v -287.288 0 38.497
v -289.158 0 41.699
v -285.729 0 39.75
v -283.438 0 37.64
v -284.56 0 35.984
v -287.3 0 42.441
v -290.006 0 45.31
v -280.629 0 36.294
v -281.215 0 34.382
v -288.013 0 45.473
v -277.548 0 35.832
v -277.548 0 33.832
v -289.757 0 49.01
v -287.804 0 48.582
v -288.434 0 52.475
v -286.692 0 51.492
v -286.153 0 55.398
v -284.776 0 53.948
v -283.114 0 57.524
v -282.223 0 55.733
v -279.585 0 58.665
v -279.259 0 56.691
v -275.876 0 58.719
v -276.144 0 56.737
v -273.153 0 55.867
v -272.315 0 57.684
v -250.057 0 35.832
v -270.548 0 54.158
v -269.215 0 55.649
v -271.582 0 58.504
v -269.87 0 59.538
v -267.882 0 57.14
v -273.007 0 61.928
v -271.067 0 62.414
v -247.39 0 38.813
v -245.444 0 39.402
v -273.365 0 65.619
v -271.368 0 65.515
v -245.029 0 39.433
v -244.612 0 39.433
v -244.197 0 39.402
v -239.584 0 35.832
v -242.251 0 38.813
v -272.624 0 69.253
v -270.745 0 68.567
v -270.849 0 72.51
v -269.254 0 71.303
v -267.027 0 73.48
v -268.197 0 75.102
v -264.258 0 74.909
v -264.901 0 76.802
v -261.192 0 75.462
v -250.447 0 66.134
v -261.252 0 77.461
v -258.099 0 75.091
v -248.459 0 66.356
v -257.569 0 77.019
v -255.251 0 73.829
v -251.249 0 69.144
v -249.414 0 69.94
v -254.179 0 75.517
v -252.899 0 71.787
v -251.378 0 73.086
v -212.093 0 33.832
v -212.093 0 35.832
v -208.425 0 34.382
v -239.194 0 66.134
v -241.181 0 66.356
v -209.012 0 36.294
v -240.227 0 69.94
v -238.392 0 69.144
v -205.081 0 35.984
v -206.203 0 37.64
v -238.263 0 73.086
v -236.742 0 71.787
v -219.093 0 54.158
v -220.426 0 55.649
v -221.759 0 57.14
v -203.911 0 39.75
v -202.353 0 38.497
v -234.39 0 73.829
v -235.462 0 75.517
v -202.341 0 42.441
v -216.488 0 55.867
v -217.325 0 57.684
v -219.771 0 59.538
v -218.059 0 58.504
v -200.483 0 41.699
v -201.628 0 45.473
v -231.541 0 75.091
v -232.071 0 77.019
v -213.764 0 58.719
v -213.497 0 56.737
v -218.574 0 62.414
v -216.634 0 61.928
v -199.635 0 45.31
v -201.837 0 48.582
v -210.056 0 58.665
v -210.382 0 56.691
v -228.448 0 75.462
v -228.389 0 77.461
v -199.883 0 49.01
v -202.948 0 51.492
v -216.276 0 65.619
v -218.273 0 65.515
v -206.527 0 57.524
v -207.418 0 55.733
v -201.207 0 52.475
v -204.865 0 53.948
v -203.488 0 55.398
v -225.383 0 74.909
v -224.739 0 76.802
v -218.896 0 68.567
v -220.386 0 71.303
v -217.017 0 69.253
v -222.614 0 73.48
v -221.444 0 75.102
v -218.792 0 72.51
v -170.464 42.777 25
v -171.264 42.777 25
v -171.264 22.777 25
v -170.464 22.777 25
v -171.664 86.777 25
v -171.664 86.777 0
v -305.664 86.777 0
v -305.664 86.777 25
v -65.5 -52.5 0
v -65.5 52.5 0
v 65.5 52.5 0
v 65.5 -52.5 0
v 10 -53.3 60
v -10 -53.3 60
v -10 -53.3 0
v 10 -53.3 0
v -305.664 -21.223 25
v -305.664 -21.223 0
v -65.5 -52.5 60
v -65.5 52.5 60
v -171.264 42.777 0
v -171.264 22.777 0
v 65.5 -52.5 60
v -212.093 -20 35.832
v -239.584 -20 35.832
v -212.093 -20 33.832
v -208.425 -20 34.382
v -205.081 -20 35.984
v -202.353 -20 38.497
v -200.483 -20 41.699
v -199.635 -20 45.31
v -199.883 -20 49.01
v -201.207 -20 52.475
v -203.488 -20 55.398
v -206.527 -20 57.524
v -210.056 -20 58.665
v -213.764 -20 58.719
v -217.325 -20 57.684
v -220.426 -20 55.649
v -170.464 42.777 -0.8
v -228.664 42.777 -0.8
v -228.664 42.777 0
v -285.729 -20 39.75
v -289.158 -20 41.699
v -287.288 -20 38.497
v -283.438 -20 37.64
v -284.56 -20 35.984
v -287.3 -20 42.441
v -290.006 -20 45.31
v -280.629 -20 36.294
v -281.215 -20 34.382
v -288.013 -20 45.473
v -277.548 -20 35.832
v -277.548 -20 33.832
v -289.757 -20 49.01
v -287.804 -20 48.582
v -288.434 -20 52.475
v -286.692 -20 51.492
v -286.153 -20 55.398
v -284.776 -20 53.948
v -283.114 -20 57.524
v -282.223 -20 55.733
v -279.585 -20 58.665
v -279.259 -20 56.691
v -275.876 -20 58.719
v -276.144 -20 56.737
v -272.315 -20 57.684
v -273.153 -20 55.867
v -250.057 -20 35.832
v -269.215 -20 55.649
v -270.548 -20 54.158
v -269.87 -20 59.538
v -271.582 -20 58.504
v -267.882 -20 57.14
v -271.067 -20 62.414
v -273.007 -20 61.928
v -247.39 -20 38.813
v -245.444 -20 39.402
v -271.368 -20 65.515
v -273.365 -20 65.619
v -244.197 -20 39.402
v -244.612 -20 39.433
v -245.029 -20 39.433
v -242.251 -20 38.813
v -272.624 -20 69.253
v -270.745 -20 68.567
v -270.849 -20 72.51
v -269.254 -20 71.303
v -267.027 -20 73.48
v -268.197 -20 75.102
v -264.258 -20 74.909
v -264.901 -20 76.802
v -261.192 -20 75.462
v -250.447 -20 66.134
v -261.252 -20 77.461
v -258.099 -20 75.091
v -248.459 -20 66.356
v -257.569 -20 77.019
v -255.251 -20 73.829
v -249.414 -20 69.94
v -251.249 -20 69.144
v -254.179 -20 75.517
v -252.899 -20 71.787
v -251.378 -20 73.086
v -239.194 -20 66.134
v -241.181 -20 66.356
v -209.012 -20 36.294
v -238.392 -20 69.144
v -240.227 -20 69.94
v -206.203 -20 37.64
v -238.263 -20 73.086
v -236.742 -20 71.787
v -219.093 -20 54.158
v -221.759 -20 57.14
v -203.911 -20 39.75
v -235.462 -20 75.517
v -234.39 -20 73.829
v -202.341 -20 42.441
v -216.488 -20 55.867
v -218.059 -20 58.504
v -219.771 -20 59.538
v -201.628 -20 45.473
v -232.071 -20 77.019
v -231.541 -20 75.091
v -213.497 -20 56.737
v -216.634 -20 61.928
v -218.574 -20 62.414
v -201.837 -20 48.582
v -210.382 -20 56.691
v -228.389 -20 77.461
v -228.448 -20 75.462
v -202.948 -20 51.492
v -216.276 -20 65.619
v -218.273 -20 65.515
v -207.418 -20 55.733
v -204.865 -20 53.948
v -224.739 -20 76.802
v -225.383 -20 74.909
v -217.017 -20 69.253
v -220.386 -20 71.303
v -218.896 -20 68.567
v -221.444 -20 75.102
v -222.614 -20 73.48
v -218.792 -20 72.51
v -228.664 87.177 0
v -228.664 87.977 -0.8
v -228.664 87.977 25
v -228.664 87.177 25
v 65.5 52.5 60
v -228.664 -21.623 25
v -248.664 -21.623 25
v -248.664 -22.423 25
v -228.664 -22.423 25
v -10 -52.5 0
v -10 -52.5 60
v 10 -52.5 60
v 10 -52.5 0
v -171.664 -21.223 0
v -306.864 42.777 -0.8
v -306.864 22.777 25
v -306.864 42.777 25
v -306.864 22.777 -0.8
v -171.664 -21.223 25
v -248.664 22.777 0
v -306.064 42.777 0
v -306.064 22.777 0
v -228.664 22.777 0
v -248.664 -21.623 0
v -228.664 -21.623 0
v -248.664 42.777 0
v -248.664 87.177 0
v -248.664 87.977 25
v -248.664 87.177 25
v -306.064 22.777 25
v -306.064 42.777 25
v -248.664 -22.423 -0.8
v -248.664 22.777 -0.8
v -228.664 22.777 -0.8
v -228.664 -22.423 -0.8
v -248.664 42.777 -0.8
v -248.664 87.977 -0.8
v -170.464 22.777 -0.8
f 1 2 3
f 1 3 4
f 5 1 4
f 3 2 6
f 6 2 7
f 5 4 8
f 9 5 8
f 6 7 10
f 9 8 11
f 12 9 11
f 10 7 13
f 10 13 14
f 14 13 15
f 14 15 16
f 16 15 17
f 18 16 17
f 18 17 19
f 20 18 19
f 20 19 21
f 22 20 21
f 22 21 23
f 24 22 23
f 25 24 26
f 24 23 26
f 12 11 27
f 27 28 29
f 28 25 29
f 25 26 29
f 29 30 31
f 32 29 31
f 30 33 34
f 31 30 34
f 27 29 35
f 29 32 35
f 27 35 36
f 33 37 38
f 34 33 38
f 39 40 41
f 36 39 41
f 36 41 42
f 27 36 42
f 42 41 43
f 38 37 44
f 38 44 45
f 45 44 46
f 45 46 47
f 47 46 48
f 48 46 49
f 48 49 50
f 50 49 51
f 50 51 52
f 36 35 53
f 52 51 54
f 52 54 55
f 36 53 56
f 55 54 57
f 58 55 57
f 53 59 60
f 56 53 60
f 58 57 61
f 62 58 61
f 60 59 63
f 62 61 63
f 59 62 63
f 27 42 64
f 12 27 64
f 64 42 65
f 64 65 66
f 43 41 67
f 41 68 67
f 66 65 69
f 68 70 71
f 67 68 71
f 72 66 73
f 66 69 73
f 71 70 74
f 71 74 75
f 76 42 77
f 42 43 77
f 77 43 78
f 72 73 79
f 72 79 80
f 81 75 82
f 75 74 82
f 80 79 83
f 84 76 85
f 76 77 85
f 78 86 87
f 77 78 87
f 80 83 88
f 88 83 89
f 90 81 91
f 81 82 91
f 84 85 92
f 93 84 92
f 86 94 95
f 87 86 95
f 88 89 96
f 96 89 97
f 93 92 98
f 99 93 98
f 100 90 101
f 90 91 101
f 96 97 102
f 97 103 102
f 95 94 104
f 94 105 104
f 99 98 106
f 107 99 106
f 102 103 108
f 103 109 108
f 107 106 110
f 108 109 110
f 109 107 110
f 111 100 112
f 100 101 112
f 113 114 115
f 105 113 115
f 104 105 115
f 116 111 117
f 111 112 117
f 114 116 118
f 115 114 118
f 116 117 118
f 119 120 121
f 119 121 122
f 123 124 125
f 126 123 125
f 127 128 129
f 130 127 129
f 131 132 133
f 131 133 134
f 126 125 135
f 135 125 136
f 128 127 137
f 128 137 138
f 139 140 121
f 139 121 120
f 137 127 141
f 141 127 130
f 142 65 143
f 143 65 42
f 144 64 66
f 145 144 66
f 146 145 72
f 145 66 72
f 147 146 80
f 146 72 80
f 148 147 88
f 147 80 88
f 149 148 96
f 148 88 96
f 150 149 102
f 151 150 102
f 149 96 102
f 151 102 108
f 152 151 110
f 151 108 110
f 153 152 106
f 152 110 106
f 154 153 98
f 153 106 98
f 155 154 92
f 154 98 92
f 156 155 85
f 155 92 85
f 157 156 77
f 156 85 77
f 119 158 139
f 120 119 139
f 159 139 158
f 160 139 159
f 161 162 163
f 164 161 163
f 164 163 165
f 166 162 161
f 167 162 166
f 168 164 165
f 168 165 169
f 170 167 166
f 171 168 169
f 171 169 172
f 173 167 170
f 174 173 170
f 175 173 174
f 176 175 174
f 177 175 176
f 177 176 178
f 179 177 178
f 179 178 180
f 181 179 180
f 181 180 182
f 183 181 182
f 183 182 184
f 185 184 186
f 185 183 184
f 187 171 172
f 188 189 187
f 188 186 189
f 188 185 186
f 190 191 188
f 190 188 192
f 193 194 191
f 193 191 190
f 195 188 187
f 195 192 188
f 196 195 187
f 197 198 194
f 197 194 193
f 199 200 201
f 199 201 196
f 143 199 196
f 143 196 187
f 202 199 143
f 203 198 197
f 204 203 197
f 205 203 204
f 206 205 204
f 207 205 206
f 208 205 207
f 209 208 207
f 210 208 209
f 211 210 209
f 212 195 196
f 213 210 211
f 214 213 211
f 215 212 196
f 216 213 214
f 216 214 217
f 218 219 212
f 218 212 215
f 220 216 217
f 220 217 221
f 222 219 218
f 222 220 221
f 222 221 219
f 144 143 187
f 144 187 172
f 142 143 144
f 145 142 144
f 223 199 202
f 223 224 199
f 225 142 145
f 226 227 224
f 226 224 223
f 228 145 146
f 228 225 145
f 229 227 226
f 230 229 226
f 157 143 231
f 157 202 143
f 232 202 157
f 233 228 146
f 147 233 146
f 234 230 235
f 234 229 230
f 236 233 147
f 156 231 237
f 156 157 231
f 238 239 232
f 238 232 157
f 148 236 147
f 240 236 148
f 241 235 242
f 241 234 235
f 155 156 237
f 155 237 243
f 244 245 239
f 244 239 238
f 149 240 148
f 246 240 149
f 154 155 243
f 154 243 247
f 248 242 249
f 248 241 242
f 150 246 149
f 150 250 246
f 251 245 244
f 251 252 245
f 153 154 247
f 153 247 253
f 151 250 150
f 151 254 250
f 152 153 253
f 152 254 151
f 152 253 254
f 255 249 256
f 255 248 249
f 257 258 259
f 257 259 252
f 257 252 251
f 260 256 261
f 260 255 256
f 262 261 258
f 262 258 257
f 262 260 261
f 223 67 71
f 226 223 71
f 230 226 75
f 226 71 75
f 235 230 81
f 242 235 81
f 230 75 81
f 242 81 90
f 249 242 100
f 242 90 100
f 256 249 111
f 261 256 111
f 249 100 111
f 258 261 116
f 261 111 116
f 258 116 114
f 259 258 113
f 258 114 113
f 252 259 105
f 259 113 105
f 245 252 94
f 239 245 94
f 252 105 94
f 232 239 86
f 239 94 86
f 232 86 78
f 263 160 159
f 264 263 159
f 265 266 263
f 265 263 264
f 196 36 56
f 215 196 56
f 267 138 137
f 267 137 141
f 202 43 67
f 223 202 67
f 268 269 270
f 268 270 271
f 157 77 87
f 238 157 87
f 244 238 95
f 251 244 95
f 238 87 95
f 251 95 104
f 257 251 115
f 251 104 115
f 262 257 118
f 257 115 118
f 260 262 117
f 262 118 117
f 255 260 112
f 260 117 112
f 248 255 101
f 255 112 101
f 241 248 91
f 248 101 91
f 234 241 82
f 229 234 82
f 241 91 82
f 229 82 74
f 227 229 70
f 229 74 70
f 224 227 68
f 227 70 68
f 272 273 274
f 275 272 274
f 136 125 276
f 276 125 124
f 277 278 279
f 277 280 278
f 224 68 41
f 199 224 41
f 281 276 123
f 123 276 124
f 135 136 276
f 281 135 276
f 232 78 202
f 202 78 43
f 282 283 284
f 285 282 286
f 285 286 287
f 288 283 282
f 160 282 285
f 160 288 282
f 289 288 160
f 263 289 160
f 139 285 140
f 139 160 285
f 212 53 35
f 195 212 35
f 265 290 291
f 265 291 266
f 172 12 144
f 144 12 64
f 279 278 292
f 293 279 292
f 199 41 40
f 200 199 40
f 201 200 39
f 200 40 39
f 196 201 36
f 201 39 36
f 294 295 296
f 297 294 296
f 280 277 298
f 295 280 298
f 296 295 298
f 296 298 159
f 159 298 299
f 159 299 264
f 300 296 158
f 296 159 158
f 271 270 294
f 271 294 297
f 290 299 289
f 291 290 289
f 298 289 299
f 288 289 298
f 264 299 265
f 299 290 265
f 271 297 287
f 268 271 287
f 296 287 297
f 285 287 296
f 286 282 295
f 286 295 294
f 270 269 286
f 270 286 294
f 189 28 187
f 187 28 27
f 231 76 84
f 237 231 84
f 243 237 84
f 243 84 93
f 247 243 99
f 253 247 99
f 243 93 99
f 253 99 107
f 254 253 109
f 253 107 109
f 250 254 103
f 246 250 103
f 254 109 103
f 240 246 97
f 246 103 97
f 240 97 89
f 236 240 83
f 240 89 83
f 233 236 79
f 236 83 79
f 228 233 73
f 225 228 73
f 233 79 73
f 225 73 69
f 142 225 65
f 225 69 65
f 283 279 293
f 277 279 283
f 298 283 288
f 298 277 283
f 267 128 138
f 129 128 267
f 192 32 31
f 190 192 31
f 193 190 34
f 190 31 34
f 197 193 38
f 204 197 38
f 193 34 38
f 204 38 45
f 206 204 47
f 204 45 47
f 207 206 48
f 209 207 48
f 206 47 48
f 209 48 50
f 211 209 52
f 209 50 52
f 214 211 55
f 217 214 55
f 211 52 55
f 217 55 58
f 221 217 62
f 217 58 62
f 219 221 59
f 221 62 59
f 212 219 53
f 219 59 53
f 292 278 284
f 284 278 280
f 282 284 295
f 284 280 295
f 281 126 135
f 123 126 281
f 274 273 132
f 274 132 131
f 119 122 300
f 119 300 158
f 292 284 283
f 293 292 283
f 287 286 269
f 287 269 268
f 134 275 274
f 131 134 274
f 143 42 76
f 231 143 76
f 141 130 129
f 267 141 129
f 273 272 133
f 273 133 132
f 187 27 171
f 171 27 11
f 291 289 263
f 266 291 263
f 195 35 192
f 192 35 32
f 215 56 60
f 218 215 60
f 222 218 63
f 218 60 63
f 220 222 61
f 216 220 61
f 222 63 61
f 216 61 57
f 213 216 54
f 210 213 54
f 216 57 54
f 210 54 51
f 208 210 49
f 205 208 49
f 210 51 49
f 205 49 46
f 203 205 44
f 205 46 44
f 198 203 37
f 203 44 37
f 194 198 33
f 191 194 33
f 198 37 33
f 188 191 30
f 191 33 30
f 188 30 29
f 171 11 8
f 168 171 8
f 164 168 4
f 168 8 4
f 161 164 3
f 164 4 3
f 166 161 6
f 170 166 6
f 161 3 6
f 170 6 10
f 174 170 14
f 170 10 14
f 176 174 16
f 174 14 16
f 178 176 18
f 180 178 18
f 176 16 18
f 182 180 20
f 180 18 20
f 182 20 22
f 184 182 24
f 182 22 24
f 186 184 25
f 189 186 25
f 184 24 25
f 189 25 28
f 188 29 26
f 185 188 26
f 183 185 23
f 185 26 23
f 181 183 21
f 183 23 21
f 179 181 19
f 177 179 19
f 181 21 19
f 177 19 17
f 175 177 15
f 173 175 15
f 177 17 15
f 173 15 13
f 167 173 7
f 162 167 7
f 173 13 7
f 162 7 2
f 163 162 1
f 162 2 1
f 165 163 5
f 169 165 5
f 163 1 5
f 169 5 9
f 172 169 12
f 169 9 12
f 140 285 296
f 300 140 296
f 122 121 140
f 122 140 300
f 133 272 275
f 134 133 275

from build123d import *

# Parameters (mm, degrees)
F0_W     = 131
F0_H     = 105
F1_DEPTH = 60
F2_DEPTH = 25
F0_W_2   = 57
F0_H_2   = 44
F0_W_3   = 20
F0_H_3   = 20
F0_W_4   = 0.8
F0_W_5   = 0.4
F0_H_4   = 0.8
F0_H_5   = 0.4
F3_DEPTH = 0.8
F4_DEPTH = 25
F5_W     = 20
F5_H     = 60
F6_DEPTH = 0.8
F8_DEPTH = 20


with BuildPart() as f1:
    # F0 (on Top) → F1 (new body)
    with BuildSketch(Plane.XY):
        Rectangle(F0_W, F0_H)
    extrude(amount=F1_DEPTH)

    # F0 (on Top) → F2 (join)
    with BuildSketch(Plane.XY):
        Rectangle(F0_W, F0_H)
    extrude(amount=F2_DEPTH)


with BuildPart() as f2:
    # F0 (on Top) → F2, piece 2 (new body)
    with BuildSketch(Plane.XY):
        with Locations((-200.1639879942, 0.7772630274)):
            Rectangle(F0_W_2, F0_H_2)
        with Locations((-277.1639879942, 0.7772630274)):
            Rectangle(F0_W_2, F0_H_2)
        with Locations((-200.1639879942, 64.7772630274)):
            Rectangle(F0_W_2, F0_H_2)
        with Locations((-277.1639879942, 64.7772630274)):
            Rectangle(F0_W_2, F0_H_2)
        with Locations((-238.6639879942, 0.7772630274)):
            Rectangle(F0_W_3, F0_H_2)
        with Locations((-238.6639879942, 64.7772630274)):
            Rectangle(F0_W_3, F0_H_2)
        with Locations((-200.1639879942, 32.7772630274)):
            Rectangle(F0_W_2, F0_H_3)
        with Locations((-277.1639879942, 32.7772630274)):
            Rectangle(F0_W_2, F0_H_3)
        with Locations((-238.6639879942, 32.7772630274)):
            Rectangle(F0_W_3, F0_H_3)
    extrude(amount=F2_DEPTH)


with BuildPart() as f3:
    # F0 (on Top) → F3 (new body)
    with BuildSketch(Plane.XY):
        with Locations((-306.4639879942, 32.7772630274)):
            Rectangle(F0_W_4, F0_H_3)
        with Locations((-305.8639879942, 32.7772630274)):
            Rectangle(F0_W_5, F0_H_3)
        with Locations((-277.1639879942, 32.7772630274)):
            Rectangle(F0_W_2, F0_H_3)
        with Locations((-171.4639879942, 32.7772630274)):
            Rectangle(F0_W_5, F0_H_3)
        with Locations((-170.8639879942, 32.7772630274)):
            Rectangle(F0_W_4, F0_H_3)
        with Locations((-238.6639879942, 87.5772630274)):
            Rectangle(F0_W_3, F0_H_4)
        with Locations((-238.6639879942, 86.9772630274)):
            Rectangle(F0_W_3, F0_H_5)
        with Locations((-238.6639879942, -21.4227369726)):
            Rectangle(F0_W_3, F0_H_5)
        with Locations((-238.6639879942, -22.0227369726)):
            Rectangle(F0_W_3, F0_H_4)
        with Locations((-238.6639879942, 32.7772630274)):
            Rectangle(F0_W_3, F0_H_3)
        with Locations((-200.1639879942, 32.7772630274)):
            Rectangle(F0_W_2, F0_H_3)
        with Locations((-238.6639879942, 64.7772630274)):
            Rectangle(F0_W_3, F0_H_2)
        with Locations((-238.6639879942, 0.7772630274)):
            Rectangle(F0_W_3, F0_H_2)
    extrude(amount=-F3_DEPTH)

    # F0 (on Top) → F4 (join)
    with BuildSketch(Plane.XY):
        with Locations((-306.4639879942, 32.7772630274)):
            Rectangle(F0_W_4, F0_H_3)
        with Locations((-238.6639879942, 87.5772630274)):
            Rectangle(F0_W_3, F0_H_4)
        with Locations((-170.8639879942, 32.7772630274)):
            Rectangle(F0_W_4, F0_H_3)
        with Locations((-238.6639879942, -22.0227369726)):
            Rectangle(F0_W_3, F0_H_4)
    extrude(amount=F4_DEPTH)


with BuildPart() as f6:
    # F5 (on face) → F6 (new body)
    with BuildSketch(Plane.XZ.offset(52.5)):
        with Locations((0, 30)):
            Rectangle(F5_W, F5_H)
    extrude(amount=F6_DEPTH)


with BuildPart() as f8:
    # F7 (on Front) → F8 (new body)
    with BuildSketch(Plane.XZ):
        with BuildLine():
            Line((-248.9985047722, 37.5683713583), (-269.2148374575, 55.6489395324))
            ThreePointArc((-269.2148374575, 55.6489395324), (-289.2250390776, 50.7916934422), (-277.547794532, 33.8316531037))
            Line((-277.547794532, 33.8316531037), (-250.4257176805, 33.8316531037))
            ThreePointArc((-250.4257176805, 33.8316531037), (-250.3327097264, 34.8485258382), (-250.0567723832, 35.8316531037))
            ThreePointArc((-250.0567723832, 35.8316531037), (-249.60706278, 36.7484092929), (-248.9985047722, 37.5683713583))
        make_face()
        with BuildLine():
            Line((-270.5481105894, 54.1581737038), (-250.0567723832, 35.8316531037))
            Line((-250.0567723832, 35.8316531037), (-277.547794532, 35.8316531037))
            ThreePointArc((-277.547794532, 35.8316531037), (-287.3566799503, 50.078086988), (-270.5481105894, 54.1581737038))
        make_face(mode=Mode.SUBTRACT)
        with BuildLine():
            Line((-244.820387212, 33.8316531037), (-248.9985047722, 37.5683713583))
            ThreePointArc((-248.9985047722, 37.5683713583), (-249.60706278, 36.7484092929), (-250.0567723832, 35.8316531037))
            ThreePointArc((-250.0567723832, 35.8316531037), (-250.3327097264, 34.8485258382), (-250.4257176805, 33.8316531037))
            Line((-250.4257176805, 33.8316531037), (-244.820387212, 33.8316531037))
        make_face()
        with BuildLine():
            ThreePointArc((-247.3902261193, 38.8131847609), (-248.2512936846, 38.2643284175), (-248.9985047722, 37.5683713583))
            Line((-248.9985047722, 37.5683713583), (-244.820387212, 33.8316531037))
            Line((-244.820387212, 33.8316531037), (-245.44365163, 39.4022249887))
            ThreePointArc((-245.44365163, 39.4022249887), (-246.4438770669, 39.1967262954), (-247.3902261193, 38.8131847609))
        make_face()
        with BuildLine():
            ThreePointArc((-248.4593927251, 66.3561181841), (-266.612672978, 76.0751420302), (-269.2148374575, 55.6489395324))
            Line((-269.2148374575, 55.6489395324), (-248.9985047722, 37.5683713583))
            ThreePointArc((-248.9985047722, 37.5683713583), (-248.2512936846, 38.2643284175), (-247.3902261193, 38.8131847609))
            ThreePointArc((-247.3902261193, 38.8131847609), (-246.4438770669, 39.1967262954), (-245.44365163, 39.4022249887))
            Line((-245.44365163, 39.4022249887), (-248.4593927251, 66.3561181841))
        make_face()
        with BuildLine():
            Line((-250.4469907504, 66.1337354284), (-247.3902261193, 38.8131847609))
            Line((-247.3902261193, 38.8131847609), (-267.8815643255, 57.139705361))
            ThreePointArc((-267.8815643255, 57.139705361), (-265.6957461628, 74.2977154592), (-250.4469907504, 66.1337354284))
        make_face(mode=Mode.SUBTRACT)
        with BuildLine():
            Line((-241.1813816988, 66.3561181841), (-244.1971227939, 39.4022249887))
            ThreePointArc((-244.1971227939, 39.4022249887), (-243.196897357, 39.1967262954), (-242.2505483046, 38.8131847609))
            ThreePointArc((-242.2505483046, 38.8131847609), (-241.3894807393, 38.2643284175), (-240.6422696518, 37.5683713583))
            Line((-240.6422696518, 37.5683713583), (-220.4259369665, 55.6489395324))
            ThreePointArc((-220.4259369665, 55.6489395324), (-223.0281014459, 76.0751420302), (-241.1813816988, 66.3561181841))
        make_face()
        with BuildLine():
            Line((-221.7592100984, 57.139705361), (-242.2505483046, 38.8131847609))
            Line((-242.2505483046, 38.8131847609), (-239.1937836735, 66.1337354284))
            ThreePointArc((-239.1937836735, 66.1337354284), (-223.9450282611, 74.2977154592), (-221.7592100984, 57.139705361))
        make_face(mode=Mode.SUBTRACT)
        with BuildLine():
            Line((-244.1971227939, 39.4022249887), (-244.820387212, 33.8316531037))
            Line((-244.820387212, 33.8316531037), (-240.6422696518, 37.5683713583))
            ThreePointArc((-240.6422696518, 37.5683713583), (-241.3894807393, 38.2643284175), (-242.2505483046, 38.8131847609))
            ThreePointArc((-242.2505483046, 38.8131847609), (-243.196897357, 39.1967262954), (-244.1971227939, 39.4022249887))
        make_face()
        with BuildLine():
            ThreePointArc((-244.1971227939, 39.4022249887), (-244.820387212, 39.4369835722), (-245.44365163, 39.4022249887))
            Line((-245.44365163, 39.4022249887), (-244.820387212, 33.8316531037))
            Line((-244.820387212, 33.8316531037), (-244.1971227939, 39.4022249887))
        make_face()
        with BuildLine():
            Line((-240.6422696518, 37.5683713583), (-244.820387212, 33.8316531037))
            Line((-244.820387212, 33.8316531037), (-239.2150567434, 33.8316531037))
            ThreePointArc((-239.2150567434, 33.8316531037), (-239.3080646975, 34.8485258382), (-239.5840020407, 35.8316531037))
            ThreePointArc((-239.5840020407, 35.8316531037), (-240.0337116439, 36.7484092929), (-240.6422696518, 37.5683713583))
        make_face()
        with BuildLine():
            Line((-220.4259369665, 55.6489395324), (-240.6422696518, 37.5683713583))
            ThreePointArc((-240.6422696518, 37.5683713583), (-240.0337116439, 36.7484092929), (-239.5840020407, 35.8316531037))
            ThreePointArc((-239.5840020407, 35.8316531037), (-239.3080646975, 34.8485258382), (-239.2150567434, 33.8316531037))
            Line((-239.2150567434, 33.8316531037), (-212.0929798919, 33.8316531037))
            ThreePointArc((-212.0929798919, 33.8316531037), (-200.4157353463, 50.7916934422), (-220.4259369665, 55.6489395324))
        make_face()
        with BuildLine():
            Line((-212.0929798919, 35.8316531037), (-239.5840020407, 35.8316531037))
            Line((-239.5840020407, 35.8316531037), (-219.0926638345, 54.1581737038))
            ThreePointArc((-219.0926638345, 54.1581737038), (-202.2840944736, 50.078086988), (-212.0929798919, 35.8316531037))
        make_face(mode=Mode.SUBTRACT)
    extrude(amount=F8_DEPTH)


solid = Compound([f1.part, f2.part, f3.part, f6.part, f8.part])
